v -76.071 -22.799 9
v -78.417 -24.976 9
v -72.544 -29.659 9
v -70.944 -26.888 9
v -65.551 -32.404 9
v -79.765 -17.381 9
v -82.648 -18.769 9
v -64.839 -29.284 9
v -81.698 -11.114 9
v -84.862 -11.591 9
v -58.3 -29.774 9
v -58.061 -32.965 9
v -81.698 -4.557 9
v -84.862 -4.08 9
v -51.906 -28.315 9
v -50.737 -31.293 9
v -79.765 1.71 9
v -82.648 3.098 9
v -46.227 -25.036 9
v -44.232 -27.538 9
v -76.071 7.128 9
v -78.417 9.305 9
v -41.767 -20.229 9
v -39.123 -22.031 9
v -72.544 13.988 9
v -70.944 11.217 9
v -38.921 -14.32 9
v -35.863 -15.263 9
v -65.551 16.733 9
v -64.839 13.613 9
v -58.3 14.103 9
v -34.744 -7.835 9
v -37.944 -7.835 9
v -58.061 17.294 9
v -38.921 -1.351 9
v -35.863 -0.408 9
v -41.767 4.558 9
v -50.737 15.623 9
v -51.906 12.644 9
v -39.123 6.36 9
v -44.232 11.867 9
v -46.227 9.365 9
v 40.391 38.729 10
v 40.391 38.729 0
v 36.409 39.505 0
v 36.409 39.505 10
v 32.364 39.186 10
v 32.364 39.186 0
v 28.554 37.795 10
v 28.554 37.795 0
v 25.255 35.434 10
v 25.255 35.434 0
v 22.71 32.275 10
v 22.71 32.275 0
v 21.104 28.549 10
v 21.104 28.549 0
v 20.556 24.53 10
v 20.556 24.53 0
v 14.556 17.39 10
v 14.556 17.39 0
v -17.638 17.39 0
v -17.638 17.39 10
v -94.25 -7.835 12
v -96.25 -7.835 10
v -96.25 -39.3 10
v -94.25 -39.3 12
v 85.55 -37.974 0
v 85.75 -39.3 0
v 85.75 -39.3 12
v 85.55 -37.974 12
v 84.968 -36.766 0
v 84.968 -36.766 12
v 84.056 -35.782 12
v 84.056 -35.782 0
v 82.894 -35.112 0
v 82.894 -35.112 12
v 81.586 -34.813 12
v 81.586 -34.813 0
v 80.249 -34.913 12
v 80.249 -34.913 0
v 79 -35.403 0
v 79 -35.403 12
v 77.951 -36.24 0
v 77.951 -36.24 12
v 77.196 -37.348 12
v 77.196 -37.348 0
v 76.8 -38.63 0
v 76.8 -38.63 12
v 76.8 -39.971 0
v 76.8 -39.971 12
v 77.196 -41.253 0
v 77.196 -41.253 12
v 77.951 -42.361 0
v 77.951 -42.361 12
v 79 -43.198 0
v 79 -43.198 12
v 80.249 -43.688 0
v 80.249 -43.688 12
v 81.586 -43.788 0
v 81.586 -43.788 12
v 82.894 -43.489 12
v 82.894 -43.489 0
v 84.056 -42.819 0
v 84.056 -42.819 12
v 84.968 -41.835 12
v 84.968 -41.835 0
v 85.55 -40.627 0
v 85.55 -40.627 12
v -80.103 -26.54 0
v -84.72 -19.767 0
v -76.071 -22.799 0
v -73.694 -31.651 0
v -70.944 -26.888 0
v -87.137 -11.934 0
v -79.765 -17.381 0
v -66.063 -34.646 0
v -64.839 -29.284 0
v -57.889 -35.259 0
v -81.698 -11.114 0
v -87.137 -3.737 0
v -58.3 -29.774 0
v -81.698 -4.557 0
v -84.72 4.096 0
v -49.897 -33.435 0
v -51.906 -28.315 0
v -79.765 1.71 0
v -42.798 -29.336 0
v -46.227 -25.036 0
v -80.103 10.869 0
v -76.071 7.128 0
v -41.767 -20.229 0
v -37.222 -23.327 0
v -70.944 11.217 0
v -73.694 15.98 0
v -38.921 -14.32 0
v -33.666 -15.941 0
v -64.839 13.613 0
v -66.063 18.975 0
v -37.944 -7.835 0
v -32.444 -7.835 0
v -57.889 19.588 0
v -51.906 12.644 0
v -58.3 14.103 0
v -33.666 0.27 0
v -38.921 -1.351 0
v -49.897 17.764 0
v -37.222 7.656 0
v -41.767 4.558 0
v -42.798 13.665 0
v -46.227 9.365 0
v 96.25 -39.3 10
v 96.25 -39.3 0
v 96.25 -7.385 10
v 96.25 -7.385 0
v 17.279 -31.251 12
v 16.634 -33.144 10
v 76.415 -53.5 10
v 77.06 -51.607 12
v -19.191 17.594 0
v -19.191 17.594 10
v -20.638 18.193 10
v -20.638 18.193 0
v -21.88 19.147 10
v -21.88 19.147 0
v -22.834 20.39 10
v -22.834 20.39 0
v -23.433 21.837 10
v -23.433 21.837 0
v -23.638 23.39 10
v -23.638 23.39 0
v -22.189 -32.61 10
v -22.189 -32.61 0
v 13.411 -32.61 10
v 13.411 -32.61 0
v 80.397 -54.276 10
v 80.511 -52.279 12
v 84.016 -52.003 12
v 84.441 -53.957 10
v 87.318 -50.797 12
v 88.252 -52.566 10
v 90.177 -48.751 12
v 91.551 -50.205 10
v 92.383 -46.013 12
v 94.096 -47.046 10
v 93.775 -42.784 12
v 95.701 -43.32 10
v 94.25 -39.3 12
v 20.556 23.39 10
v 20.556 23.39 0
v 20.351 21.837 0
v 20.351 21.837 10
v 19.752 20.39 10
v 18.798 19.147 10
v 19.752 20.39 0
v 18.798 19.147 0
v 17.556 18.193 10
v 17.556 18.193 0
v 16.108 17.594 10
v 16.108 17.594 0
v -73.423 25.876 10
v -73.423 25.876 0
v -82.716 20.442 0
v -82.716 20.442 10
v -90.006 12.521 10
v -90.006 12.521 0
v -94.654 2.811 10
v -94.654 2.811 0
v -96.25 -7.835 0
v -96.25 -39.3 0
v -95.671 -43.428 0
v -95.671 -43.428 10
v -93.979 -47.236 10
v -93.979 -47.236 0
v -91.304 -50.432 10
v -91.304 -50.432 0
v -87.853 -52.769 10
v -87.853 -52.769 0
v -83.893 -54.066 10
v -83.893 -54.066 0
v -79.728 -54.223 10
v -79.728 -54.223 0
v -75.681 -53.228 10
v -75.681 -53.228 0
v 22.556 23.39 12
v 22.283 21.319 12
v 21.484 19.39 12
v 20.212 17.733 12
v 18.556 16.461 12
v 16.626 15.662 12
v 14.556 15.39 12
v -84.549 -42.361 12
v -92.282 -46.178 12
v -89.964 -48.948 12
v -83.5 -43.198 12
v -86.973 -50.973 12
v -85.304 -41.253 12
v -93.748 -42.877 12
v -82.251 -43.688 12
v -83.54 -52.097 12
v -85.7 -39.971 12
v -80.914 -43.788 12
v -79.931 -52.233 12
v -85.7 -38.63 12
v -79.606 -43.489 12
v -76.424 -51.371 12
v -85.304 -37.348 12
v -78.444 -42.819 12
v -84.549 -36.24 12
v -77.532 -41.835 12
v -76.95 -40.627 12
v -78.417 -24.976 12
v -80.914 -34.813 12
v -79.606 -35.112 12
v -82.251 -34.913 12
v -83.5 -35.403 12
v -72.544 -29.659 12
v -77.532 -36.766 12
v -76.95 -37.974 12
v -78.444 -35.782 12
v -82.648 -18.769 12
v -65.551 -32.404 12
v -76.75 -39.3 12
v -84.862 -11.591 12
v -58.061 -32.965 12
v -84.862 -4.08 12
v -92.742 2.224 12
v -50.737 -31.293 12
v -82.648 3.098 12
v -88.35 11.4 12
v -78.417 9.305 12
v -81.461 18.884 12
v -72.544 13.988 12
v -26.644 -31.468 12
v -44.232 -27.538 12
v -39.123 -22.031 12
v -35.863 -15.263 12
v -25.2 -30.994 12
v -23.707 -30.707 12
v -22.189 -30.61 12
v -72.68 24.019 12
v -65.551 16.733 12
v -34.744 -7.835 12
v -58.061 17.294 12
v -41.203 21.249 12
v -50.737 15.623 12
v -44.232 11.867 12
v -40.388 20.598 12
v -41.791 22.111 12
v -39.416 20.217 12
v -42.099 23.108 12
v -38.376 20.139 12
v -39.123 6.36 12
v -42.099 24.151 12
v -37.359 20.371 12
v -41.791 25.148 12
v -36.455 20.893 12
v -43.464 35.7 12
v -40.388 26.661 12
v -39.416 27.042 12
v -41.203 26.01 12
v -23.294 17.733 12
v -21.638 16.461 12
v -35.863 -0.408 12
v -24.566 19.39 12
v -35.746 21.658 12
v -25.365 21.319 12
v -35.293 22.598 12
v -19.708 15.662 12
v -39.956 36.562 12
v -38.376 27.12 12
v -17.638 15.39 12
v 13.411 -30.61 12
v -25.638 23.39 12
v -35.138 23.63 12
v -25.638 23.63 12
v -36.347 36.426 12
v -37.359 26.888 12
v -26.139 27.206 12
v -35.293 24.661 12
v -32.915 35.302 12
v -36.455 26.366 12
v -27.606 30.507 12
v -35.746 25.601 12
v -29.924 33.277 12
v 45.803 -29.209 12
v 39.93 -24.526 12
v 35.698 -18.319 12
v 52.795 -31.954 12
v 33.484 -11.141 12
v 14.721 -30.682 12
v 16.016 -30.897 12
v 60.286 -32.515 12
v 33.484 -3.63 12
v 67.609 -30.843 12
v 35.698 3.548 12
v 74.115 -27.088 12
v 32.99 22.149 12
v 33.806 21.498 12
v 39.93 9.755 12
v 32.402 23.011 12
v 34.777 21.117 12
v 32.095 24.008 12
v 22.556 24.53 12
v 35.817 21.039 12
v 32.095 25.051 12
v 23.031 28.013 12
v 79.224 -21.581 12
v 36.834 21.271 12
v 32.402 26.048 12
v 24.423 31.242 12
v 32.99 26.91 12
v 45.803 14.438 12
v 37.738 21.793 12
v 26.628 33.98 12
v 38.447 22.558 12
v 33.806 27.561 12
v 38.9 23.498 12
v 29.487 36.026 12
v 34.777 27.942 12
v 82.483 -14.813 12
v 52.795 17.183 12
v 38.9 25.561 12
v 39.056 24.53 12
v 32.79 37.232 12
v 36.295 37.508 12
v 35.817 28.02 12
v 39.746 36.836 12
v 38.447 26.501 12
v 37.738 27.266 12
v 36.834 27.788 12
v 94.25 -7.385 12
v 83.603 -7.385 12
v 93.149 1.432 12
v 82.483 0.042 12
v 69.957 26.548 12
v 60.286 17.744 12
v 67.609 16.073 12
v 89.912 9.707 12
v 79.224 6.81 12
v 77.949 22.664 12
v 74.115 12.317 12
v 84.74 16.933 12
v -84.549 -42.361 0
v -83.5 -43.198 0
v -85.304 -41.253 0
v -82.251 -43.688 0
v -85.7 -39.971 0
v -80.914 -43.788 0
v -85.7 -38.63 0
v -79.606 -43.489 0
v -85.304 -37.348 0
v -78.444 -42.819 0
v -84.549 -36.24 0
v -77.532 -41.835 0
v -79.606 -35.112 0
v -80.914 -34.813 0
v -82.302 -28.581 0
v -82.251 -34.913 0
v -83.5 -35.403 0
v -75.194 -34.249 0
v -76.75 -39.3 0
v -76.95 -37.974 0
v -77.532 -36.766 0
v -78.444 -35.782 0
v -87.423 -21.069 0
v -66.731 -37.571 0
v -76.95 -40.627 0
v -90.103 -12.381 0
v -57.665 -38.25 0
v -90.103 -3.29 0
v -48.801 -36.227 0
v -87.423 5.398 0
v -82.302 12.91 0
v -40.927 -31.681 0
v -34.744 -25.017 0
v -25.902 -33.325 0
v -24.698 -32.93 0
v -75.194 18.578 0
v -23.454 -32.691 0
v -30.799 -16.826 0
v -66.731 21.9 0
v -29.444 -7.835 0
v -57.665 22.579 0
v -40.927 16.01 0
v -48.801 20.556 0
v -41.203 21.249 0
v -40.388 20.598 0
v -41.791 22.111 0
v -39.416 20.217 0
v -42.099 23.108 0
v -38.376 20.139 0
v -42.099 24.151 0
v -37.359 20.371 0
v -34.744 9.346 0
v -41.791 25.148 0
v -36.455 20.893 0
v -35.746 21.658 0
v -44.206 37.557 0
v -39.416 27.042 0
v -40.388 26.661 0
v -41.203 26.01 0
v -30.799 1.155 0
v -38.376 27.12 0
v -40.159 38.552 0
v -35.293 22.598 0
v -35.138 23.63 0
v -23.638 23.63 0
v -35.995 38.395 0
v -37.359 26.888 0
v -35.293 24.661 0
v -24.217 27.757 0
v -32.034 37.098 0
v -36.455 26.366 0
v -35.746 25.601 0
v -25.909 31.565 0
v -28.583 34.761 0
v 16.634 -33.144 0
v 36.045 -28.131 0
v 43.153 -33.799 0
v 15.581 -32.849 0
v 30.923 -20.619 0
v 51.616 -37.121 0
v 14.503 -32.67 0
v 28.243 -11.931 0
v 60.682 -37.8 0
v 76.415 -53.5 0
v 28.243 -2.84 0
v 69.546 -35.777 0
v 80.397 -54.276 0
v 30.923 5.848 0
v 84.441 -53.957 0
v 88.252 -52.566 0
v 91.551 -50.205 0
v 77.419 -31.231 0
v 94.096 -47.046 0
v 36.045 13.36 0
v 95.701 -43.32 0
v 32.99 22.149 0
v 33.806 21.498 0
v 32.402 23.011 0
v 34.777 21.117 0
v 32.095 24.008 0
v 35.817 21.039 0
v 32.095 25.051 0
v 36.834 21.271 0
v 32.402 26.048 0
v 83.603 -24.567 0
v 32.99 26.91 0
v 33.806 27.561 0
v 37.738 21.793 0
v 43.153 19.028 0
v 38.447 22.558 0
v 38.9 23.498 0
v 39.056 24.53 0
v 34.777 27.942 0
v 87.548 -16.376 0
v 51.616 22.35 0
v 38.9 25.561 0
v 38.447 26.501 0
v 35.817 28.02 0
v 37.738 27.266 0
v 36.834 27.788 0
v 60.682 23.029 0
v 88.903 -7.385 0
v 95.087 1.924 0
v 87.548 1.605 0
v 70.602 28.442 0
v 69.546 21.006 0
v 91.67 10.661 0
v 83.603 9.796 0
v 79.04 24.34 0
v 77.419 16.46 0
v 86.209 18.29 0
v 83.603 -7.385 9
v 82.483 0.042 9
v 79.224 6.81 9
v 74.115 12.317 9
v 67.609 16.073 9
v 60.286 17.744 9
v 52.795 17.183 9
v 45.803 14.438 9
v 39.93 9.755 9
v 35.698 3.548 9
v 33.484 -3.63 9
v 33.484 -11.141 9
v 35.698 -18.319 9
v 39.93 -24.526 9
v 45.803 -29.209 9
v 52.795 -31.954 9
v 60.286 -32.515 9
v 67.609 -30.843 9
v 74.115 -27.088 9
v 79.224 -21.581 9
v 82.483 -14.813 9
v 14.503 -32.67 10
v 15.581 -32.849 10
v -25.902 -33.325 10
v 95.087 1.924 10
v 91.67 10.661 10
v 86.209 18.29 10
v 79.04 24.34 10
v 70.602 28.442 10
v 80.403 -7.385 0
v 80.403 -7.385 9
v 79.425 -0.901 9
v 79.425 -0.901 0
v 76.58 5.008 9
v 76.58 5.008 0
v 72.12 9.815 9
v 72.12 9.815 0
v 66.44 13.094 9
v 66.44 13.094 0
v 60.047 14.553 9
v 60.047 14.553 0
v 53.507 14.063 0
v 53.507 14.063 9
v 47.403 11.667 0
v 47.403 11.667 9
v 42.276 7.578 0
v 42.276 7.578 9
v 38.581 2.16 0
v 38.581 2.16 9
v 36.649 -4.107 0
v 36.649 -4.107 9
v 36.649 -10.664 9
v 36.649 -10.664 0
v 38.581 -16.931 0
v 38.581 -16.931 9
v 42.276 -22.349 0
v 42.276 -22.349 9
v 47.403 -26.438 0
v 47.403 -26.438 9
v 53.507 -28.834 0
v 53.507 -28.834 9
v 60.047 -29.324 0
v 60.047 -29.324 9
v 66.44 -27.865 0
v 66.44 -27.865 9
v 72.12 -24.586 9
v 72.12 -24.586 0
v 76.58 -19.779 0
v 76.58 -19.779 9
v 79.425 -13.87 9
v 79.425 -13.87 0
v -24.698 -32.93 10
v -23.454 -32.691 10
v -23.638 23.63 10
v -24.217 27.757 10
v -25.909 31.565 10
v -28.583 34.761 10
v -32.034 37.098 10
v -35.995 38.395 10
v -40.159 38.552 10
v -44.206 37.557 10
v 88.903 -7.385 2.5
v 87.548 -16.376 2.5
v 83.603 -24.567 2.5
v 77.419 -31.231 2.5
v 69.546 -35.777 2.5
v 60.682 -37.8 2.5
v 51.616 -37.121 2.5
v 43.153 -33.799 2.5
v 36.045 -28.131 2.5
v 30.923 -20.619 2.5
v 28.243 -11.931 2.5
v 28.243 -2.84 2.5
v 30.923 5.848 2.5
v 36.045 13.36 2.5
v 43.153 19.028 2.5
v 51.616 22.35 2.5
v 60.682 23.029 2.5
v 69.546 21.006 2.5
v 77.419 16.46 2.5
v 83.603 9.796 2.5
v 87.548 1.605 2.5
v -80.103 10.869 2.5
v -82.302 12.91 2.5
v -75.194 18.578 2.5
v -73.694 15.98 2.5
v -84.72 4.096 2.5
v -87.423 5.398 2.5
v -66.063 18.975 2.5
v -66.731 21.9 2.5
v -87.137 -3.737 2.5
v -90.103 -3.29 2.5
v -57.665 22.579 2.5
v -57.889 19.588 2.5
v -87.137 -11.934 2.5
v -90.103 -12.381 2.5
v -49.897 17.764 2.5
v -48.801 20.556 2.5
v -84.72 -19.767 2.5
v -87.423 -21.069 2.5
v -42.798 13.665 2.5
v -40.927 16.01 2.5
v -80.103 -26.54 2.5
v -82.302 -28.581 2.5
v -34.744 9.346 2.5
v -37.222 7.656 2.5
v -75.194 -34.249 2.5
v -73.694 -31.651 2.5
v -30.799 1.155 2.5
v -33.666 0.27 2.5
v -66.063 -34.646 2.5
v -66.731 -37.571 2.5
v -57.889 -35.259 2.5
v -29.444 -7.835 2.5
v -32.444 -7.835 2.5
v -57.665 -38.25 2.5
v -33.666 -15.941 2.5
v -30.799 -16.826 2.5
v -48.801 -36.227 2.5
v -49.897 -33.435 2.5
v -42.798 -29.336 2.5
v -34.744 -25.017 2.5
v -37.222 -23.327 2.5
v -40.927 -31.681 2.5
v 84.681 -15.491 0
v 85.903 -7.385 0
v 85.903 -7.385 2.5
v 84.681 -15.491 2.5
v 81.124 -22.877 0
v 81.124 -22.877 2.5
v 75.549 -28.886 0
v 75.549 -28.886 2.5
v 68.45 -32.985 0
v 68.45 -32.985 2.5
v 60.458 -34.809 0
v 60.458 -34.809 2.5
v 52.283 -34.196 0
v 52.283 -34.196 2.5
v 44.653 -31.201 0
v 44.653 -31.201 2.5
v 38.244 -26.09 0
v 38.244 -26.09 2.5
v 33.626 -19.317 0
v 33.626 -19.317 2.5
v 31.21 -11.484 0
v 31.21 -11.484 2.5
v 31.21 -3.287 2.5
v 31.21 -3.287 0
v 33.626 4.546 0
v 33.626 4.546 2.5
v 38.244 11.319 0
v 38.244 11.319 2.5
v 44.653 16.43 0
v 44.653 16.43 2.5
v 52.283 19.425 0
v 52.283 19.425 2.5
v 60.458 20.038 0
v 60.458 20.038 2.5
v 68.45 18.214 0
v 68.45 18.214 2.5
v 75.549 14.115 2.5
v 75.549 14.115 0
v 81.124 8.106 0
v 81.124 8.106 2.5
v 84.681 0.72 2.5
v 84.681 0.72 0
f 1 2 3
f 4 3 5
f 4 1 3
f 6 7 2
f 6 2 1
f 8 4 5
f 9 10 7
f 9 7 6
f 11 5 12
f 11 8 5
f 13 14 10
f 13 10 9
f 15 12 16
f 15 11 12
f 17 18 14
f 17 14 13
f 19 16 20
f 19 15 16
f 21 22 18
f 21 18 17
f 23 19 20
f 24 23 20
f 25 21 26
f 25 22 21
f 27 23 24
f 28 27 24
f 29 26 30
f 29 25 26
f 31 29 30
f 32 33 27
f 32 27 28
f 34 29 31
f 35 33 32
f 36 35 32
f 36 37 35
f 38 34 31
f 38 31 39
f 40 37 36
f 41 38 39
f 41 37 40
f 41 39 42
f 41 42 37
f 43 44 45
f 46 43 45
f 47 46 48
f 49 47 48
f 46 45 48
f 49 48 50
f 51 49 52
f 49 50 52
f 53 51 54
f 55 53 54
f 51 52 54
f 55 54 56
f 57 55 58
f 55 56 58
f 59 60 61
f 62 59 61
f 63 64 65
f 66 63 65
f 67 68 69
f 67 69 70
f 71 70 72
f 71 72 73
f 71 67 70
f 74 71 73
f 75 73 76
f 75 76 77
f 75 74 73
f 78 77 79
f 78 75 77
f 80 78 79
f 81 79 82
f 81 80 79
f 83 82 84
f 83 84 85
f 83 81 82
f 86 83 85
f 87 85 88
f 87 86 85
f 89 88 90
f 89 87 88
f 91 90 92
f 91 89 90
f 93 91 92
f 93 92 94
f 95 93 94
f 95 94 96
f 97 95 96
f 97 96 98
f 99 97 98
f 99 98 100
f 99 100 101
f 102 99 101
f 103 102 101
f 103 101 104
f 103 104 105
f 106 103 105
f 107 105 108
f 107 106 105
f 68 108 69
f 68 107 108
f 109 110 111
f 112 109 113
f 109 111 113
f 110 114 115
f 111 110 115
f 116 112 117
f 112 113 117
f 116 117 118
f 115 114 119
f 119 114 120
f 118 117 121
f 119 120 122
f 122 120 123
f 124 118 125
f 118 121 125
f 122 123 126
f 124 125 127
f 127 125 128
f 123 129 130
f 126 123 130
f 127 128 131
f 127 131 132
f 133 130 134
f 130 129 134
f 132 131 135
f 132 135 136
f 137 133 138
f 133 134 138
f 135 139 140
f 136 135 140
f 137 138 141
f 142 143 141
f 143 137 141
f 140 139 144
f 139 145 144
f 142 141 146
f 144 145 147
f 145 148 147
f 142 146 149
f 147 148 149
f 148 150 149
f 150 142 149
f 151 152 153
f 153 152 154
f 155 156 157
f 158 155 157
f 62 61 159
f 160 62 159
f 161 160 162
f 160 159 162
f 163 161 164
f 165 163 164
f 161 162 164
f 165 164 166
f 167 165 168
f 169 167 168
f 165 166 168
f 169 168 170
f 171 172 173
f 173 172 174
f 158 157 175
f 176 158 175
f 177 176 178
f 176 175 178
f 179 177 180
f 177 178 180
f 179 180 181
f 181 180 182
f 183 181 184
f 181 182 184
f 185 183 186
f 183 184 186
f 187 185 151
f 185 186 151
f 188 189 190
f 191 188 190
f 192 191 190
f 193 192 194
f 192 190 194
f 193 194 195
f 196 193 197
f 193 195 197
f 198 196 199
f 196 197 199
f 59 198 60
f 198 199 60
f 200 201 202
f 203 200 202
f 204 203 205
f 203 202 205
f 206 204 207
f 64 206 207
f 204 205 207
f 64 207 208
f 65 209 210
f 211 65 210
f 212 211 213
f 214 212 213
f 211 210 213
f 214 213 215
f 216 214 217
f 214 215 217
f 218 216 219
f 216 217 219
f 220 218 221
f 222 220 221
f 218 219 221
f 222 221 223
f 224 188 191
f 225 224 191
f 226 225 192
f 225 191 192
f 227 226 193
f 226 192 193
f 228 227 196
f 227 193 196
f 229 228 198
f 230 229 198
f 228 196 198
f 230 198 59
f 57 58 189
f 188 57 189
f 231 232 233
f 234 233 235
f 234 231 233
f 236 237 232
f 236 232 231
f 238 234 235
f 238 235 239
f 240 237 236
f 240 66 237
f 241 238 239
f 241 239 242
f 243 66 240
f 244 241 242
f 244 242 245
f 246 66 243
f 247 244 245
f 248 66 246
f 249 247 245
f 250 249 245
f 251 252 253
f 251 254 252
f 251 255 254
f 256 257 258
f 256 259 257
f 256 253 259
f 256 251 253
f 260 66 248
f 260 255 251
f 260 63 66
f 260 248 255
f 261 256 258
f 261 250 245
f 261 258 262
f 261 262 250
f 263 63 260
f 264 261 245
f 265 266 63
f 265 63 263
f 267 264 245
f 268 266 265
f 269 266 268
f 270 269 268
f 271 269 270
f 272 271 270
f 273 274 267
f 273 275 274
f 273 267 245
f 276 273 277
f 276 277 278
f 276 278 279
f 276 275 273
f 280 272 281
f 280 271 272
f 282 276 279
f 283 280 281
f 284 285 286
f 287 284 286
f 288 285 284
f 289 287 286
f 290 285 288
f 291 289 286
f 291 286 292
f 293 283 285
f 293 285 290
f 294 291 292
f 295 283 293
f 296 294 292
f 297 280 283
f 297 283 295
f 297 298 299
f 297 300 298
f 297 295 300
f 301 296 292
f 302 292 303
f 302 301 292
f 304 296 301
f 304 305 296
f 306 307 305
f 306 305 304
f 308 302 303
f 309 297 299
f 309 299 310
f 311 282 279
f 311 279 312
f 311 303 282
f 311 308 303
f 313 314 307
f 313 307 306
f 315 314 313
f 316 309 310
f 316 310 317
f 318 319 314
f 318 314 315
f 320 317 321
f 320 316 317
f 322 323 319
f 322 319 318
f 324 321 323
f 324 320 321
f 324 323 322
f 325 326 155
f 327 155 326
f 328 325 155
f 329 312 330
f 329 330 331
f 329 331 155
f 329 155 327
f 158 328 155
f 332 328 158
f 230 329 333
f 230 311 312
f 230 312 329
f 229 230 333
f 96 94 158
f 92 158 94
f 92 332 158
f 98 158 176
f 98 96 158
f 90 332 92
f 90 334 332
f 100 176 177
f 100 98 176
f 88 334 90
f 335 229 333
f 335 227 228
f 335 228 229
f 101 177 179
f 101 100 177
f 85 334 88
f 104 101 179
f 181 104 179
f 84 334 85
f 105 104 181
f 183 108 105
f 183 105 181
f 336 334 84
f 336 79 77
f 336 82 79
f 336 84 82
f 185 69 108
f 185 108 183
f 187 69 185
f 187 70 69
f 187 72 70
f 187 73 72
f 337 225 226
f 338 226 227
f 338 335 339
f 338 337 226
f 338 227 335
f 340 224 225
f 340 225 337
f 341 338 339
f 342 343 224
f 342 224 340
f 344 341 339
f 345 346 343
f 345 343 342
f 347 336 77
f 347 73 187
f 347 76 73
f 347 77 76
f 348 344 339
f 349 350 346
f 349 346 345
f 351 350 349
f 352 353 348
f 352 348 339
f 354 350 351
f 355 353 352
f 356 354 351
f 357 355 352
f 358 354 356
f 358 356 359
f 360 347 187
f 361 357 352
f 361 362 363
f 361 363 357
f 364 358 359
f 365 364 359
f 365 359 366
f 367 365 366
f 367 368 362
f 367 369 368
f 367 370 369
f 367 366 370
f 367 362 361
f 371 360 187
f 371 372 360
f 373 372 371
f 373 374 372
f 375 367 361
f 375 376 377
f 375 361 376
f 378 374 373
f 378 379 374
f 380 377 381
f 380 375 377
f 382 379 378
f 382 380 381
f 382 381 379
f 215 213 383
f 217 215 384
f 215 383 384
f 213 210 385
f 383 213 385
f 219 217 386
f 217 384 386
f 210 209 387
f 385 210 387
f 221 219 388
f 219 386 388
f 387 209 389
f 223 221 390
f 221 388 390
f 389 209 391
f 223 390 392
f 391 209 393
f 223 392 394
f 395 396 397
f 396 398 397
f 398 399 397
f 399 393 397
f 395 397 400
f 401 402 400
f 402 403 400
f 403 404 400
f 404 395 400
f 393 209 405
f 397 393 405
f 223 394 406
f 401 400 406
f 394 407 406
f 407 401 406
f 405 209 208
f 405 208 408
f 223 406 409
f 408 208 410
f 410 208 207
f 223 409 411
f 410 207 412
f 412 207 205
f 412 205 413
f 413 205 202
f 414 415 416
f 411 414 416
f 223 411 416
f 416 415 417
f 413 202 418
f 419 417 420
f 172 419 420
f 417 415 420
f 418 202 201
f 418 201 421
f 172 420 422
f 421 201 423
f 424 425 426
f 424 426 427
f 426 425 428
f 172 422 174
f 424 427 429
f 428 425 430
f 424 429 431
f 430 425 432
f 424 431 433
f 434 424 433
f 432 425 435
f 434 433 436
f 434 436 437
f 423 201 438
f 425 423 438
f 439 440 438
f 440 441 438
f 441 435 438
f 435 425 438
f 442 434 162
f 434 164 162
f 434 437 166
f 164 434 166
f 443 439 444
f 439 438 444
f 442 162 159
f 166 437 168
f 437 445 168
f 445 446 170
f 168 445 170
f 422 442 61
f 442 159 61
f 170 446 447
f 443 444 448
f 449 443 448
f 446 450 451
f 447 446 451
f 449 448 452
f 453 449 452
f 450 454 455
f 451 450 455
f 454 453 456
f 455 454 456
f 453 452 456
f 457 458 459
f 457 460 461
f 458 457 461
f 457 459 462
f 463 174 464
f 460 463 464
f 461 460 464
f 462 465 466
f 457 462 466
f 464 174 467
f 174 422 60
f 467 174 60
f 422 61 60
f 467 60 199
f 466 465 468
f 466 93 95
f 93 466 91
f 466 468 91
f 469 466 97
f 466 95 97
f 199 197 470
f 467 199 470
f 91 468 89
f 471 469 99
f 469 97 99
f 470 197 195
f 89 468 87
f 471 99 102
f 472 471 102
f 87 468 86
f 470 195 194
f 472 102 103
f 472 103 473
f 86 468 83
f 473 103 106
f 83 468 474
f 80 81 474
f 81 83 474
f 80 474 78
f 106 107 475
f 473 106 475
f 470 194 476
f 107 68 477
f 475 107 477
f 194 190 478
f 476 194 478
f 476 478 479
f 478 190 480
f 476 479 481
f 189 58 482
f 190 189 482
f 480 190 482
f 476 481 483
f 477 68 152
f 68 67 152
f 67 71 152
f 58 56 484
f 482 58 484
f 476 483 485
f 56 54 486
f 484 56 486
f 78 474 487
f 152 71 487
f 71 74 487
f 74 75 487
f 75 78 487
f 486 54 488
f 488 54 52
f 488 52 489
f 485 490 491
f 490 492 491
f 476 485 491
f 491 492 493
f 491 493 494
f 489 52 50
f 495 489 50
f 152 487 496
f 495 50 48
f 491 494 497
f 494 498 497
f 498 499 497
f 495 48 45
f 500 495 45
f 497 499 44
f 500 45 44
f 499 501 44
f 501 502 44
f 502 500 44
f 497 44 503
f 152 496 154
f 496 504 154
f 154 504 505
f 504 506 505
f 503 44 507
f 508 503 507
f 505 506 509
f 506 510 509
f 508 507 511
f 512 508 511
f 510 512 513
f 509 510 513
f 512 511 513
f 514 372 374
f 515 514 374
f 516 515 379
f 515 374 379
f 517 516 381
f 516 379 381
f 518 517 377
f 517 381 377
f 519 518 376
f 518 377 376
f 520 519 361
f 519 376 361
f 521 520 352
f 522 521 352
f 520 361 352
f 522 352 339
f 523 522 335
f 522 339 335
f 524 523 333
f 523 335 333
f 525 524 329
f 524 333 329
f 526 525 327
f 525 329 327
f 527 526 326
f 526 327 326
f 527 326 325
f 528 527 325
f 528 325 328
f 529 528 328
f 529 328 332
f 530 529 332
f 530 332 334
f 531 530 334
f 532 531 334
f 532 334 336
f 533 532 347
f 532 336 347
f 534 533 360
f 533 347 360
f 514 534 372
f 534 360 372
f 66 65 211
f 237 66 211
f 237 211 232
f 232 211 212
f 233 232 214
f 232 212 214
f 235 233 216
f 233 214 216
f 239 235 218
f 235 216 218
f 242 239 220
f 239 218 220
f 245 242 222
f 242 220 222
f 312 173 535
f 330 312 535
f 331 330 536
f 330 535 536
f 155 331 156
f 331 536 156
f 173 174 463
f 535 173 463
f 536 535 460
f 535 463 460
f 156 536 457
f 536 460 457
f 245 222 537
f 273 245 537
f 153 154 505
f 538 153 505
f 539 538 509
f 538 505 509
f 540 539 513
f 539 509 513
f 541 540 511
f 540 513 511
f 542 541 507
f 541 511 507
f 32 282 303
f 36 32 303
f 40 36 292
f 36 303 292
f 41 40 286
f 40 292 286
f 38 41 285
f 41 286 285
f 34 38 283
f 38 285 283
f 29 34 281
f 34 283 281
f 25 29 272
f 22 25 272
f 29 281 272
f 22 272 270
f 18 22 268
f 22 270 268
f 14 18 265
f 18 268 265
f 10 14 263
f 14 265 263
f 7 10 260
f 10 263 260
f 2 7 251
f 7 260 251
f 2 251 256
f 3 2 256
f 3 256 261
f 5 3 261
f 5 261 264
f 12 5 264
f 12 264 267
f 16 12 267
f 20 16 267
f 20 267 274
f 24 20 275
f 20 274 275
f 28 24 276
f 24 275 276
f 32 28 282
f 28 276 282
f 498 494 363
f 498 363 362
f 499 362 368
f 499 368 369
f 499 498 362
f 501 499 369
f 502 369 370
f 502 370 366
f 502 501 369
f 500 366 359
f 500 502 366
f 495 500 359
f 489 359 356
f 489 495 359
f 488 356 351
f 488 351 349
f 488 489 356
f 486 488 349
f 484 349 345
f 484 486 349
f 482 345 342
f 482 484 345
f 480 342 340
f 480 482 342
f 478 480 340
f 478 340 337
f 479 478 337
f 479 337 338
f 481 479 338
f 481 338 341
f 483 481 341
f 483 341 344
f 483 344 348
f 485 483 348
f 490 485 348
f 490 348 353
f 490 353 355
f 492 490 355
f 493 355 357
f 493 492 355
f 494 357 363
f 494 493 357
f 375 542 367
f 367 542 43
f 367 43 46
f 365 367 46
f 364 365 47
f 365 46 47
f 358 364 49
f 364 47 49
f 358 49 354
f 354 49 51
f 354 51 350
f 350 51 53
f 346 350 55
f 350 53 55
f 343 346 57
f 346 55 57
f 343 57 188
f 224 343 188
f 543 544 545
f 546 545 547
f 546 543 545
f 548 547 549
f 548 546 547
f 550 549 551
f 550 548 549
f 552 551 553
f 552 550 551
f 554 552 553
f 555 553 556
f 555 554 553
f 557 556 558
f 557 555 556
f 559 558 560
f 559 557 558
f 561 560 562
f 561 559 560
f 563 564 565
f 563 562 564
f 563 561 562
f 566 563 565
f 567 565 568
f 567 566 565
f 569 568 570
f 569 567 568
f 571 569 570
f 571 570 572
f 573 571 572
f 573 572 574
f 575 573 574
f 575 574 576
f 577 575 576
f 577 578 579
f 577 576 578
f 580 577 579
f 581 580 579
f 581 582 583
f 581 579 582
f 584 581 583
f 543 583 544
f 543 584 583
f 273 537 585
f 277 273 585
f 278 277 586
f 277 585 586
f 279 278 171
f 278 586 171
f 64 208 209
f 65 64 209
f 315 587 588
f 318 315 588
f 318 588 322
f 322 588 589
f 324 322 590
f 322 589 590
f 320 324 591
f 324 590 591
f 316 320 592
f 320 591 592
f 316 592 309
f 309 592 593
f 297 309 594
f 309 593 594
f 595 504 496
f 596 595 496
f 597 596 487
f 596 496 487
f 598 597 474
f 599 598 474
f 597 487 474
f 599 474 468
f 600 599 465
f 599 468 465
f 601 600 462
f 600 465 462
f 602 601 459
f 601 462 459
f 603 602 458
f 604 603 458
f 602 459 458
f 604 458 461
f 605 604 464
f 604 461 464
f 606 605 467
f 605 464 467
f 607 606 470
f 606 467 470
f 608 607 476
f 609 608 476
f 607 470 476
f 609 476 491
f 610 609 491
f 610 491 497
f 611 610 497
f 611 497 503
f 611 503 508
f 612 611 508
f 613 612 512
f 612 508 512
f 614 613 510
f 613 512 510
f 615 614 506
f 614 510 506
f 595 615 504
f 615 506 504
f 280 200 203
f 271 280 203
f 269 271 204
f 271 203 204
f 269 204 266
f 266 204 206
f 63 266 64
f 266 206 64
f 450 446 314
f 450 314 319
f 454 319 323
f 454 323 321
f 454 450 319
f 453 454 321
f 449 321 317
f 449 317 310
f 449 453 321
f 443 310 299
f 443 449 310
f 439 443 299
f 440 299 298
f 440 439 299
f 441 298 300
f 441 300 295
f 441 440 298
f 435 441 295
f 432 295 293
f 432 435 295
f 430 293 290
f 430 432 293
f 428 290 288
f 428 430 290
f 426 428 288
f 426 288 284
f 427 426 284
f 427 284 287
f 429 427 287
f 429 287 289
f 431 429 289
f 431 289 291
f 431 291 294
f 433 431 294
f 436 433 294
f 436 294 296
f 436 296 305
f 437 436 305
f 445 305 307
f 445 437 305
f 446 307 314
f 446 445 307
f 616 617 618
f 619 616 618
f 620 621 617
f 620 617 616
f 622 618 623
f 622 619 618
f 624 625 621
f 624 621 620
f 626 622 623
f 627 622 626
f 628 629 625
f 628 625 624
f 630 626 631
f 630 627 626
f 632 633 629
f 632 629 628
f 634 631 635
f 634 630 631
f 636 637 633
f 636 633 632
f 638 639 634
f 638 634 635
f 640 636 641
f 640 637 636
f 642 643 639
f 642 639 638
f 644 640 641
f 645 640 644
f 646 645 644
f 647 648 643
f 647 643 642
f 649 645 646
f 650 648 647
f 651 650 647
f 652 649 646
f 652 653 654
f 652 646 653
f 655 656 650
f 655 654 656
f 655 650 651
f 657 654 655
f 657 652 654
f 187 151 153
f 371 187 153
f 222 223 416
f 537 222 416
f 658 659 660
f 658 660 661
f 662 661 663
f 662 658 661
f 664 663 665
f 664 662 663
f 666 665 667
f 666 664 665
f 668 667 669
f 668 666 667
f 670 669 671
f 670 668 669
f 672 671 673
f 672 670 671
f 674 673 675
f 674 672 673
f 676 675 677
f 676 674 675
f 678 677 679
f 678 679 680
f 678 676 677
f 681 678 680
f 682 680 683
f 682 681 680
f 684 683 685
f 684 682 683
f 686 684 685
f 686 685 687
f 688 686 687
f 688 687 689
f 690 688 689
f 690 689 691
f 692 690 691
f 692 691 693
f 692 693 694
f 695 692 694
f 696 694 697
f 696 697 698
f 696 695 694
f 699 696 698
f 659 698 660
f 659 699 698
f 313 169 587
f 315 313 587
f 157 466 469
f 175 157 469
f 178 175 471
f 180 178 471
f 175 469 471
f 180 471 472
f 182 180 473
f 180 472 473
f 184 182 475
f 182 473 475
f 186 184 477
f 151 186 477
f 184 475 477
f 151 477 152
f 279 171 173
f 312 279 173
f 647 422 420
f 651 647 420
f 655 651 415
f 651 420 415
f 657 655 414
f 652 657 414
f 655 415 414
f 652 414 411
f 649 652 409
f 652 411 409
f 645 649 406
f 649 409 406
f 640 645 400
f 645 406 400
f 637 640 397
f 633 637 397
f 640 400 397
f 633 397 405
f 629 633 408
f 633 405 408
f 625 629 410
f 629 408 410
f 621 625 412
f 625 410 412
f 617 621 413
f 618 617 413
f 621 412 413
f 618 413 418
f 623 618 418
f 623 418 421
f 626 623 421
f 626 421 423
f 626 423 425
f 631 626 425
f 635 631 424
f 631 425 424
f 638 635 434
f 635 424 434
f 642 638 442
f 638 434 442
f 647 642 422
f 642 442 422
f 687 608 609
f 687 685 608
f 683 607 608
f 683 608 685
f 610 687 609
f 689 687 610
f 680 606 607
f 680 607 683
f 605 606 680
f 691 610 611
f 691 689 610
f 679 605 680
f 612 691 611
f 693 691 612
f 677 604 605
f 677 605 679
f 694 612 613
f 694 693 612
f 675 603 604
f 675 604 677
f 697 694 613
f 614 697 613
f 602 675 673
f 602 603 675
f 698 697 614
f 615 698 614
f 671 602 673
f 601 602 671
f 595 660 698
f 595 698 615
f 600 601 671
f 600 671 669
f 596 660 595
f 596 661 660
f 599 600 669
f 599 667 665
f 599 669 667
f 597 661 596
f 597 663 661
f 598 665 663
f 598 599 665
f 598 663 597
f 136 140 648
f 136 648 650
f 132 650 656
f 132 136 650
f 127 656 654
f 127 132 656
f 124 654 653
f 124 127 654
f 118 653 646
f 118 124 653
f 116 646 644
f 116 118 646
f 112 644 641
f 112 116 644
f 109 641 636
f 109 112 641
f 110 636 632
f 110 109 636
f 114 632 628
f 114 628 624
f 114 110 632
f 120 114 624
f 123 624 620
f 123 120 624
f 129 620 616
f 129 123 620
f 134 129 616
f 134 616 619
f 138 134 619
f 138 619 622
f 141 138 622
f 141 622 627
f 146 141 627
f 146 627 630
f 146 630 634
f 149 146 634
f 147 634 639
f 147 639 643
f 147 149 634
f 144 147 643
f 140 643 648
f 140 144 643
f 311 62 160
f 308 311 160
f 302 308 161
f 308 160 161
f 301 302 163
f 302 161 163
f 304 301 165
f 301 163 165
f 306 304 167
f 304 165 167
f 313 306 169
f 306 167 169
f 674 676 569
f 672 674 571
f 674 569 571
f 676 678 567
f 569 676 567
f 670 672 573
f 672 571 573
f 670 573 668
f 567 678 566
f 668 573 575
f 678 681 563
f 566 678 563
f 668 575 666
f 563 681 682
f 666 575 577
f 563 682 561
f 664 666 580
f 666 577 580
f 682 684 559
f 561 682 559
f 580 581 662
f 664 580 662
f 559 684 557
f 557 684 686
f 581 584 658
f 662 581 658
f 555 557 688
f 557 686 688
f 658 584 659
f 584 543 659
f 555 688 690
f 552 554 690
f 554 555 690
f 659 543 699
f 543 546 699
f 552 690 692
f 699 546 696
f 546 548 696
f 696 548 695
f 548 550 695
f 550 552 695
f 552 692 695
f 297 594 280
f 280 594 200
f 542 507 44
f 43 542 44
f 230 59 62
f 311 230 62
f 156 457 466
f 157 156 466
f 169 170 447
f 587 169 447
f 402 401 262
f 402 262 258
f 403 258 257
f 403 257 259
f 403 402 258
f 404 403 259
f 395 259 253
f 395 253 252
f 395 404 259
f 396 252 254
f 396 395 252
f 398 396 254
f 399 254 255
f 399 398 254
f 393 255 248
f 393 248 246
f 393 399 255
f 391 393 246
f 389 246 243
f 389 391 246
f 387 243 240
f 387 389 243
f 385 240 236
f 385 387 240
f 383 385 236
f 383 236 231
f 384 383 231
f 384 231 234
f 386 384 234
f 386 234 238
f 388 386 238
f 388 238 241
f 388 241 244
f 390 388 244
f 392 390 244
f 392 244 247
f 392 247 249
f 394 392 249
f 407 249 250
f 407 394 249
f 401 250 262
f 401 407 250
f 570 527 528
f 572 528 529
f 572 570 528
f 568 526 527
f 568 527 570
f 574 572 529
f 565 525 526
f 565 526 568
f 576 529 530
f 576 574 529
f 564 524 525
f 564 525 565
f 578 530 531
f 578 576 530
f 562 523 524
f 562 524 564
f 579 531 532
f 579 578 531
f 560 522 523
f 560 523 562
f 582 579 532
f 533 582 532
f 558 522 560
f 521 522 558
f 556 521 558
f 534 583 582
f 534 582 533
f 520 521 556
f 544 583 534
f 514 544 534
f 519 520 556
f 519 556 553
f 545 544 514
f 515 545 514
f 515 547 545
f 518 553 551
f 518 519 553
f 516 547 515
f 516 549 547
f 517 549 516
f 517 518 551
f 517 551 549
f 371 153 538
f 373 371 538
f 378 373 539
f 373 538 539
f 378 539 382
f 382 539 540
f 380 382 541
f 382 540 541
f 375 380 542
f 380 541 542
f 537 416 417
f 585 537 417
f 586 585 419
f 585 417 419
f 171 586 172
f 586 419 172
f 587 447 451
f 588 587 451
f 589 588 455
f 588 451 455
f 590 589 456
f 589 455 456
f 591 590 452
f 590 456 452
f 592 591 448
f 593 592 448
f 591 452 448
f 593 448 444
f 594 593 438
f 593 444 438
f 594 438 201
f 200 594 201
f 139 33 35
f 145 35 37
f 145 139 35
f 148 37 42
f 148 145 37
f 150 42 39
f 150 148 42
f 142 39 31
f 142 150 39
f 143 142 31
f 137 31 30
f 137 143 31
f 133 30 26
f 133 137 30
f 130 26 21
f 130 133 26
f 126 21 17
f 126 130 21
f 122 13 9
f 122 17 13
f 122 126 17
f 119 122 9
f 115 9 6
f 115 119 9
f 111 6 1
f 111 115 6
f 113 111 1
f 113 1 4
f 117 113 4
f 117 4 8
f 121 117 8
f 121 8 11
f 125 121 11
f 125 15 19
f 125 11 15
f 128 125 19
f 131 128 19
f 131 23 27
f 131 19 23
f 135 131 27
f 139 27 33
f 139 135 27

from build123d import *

# Parameters (mm, degrees)
F0_R     = 4.5
F0_R_2   = 22
F0_R_3   = 3.5
F1_DEPTH = 12
F2_R     = 25.2
F3_DEPTH = 3
F4_SIZE  = 2
F5_R     = 30.5
F5_R_2   = 27.5
F6_DEPTH = 2.5


# Not quite as in the source:
# - ends of sketch curves that miss each other by under 0.0002 mm in the source are joined


with BuildPart() as f1:
    # F0 (on Top) → F1 (new body)
    with BuildSketch(Plane.XY):
        with BuildLine():
            Line((-96.25, -7.835472), (-96.25, -39.300472))
            ThreePointArc((-96.25, -39.300472), (-89.6603385796, -51.720866719), (-75.6811726698, -53.2284353172))
            Line((-75.6811726698, -53.2284353172), (-25.901923657, -33.3251628629))
            ThreePointArc((-25.901923657, -33.3251628629), (-24.0797305928, -32.7907701516), (-22.189372, -32.610472))
            Line((-22.189372, -32.610472), (13.41096, -32.610472))
            ThreePointArc((13.41096, -32.610472), (15.0445629213, -32.7448072228), (16.6342757601, -33.1442037009))
            Line((16.6342757601, -33.1442037009), (76.4150264593, -53.4998741564))
            ThreePointArc((76.4150264593, -53.4998741564), (89.9814201421, -51.4972872524), (96.25, -39.300472))
            Line((96.25, -39.300472), (96.25, -7.385472))
            ThreePointArc((96.25, -7.385472), (89.1771507076, 14.6451910108), (70.602136617, 28.4417181588))
            Line((70.602136617, 28.4417181588), (40.3905414757, 38.7289301785))
            ThreePointArc((40.3905414757, 38.7289301785), (26.82414783, 36.7263432324), (20.555568, 24.529528))
            Line((20.555568, 24.529528), (20.555568, 23.389528))
            ThreePointArc((20.555568, 23.389528), (18.7982086871, 19.1468873129), (14.555568, 17.389528))
            Line((14.555568, 17.389528), (-17.637618, 17.389528))
            ThreePointArc((-17.637618, 17.389528), (-21.8802586871, 19.1468873129), (-23.637618, 23.389528))
            Line((-23.637618, 23.389528), (-23.637618, 23.629528))
            ThreePointArc((-23.637618, 23.629528), (-30.2272793638, 36.0499226807), (-44.2064452032, 37.557491368))
            Line((-44.2064452032, 37.557491368), (-73.4226694122, 25.875948235))
            ThreePointArc((-73.4226694122, 25.875948235), (-90.0062904382, 12.5210187268), (-96.25, -7.835472))
        make_face()
        with Locations((-81.25, -39.300472)):
            Circle(F0_R, mode=Mode.SUBTRACT)
        with Locations((-59.943809, -7.835472)):
            Circle(F0_R_2, mode=Mode.SUBTRACT)
        with Locations((81.25, -39.300472)):
            Circle(F0_R, mode=Mode.SUBTRACT)
        with Locations((-38.637618, 23.629528)):
            Circle(F0_R_3, mode=Mode.SUBTRACT)
        with Locations((58.402784, -7.385472)):
            Circle(F0_R_2, mode=Mode.SUBTRACT)
        with Locations((35.555568, 24.529528)):
            Circle(F0_R_3, mode=Mode.SUBTRACT)
    extrude(amount=F1_DEPTH)

    # F2 (on face) → F3 (cut)
    with BuildSketch(Plane.XY.offset(12)):
        with Locations((-59.943809, -7.835472)):
            Circle(F2_R)
        with Locations((58.402784, -7.385472)):
            Circle(F2_R)
    extrude(amount=-F3_DEPTH, mode=Mode.SUBTRACT)

    # F4
    f4_edges = [f1.edges().sort_by_distance(p)[0] for p in [
        (-58.814557, 31.71672, 12),
    ]]
    chamfer(f4_edges, length=F4_SIZE)

    # F5 (on face) → F6 (cut)
    with BuildSketch(Plane(origin=(0, 0, 0), x_dir=(1, 0, 0), z_dir=(0, 0, -1))):
        with Locations((-59.943809, 7.835472)):
            Circle(F5_R)
        with Locations((-59.943809, 7.835472)):
            Circle(F5_R_2, mode=Mode.SUBTRACT)
        with Locations((58.402784, 7.385472)):
            Circle(F5_R)
        with Locations((58.402784, 7.385472)):
            Circle(F5_R_2, mode=Mode.SUBTRACT)
    extrude(amount=-F6_DEPTH, mode=Mode.SUBTRACT)


solid = f1.part
